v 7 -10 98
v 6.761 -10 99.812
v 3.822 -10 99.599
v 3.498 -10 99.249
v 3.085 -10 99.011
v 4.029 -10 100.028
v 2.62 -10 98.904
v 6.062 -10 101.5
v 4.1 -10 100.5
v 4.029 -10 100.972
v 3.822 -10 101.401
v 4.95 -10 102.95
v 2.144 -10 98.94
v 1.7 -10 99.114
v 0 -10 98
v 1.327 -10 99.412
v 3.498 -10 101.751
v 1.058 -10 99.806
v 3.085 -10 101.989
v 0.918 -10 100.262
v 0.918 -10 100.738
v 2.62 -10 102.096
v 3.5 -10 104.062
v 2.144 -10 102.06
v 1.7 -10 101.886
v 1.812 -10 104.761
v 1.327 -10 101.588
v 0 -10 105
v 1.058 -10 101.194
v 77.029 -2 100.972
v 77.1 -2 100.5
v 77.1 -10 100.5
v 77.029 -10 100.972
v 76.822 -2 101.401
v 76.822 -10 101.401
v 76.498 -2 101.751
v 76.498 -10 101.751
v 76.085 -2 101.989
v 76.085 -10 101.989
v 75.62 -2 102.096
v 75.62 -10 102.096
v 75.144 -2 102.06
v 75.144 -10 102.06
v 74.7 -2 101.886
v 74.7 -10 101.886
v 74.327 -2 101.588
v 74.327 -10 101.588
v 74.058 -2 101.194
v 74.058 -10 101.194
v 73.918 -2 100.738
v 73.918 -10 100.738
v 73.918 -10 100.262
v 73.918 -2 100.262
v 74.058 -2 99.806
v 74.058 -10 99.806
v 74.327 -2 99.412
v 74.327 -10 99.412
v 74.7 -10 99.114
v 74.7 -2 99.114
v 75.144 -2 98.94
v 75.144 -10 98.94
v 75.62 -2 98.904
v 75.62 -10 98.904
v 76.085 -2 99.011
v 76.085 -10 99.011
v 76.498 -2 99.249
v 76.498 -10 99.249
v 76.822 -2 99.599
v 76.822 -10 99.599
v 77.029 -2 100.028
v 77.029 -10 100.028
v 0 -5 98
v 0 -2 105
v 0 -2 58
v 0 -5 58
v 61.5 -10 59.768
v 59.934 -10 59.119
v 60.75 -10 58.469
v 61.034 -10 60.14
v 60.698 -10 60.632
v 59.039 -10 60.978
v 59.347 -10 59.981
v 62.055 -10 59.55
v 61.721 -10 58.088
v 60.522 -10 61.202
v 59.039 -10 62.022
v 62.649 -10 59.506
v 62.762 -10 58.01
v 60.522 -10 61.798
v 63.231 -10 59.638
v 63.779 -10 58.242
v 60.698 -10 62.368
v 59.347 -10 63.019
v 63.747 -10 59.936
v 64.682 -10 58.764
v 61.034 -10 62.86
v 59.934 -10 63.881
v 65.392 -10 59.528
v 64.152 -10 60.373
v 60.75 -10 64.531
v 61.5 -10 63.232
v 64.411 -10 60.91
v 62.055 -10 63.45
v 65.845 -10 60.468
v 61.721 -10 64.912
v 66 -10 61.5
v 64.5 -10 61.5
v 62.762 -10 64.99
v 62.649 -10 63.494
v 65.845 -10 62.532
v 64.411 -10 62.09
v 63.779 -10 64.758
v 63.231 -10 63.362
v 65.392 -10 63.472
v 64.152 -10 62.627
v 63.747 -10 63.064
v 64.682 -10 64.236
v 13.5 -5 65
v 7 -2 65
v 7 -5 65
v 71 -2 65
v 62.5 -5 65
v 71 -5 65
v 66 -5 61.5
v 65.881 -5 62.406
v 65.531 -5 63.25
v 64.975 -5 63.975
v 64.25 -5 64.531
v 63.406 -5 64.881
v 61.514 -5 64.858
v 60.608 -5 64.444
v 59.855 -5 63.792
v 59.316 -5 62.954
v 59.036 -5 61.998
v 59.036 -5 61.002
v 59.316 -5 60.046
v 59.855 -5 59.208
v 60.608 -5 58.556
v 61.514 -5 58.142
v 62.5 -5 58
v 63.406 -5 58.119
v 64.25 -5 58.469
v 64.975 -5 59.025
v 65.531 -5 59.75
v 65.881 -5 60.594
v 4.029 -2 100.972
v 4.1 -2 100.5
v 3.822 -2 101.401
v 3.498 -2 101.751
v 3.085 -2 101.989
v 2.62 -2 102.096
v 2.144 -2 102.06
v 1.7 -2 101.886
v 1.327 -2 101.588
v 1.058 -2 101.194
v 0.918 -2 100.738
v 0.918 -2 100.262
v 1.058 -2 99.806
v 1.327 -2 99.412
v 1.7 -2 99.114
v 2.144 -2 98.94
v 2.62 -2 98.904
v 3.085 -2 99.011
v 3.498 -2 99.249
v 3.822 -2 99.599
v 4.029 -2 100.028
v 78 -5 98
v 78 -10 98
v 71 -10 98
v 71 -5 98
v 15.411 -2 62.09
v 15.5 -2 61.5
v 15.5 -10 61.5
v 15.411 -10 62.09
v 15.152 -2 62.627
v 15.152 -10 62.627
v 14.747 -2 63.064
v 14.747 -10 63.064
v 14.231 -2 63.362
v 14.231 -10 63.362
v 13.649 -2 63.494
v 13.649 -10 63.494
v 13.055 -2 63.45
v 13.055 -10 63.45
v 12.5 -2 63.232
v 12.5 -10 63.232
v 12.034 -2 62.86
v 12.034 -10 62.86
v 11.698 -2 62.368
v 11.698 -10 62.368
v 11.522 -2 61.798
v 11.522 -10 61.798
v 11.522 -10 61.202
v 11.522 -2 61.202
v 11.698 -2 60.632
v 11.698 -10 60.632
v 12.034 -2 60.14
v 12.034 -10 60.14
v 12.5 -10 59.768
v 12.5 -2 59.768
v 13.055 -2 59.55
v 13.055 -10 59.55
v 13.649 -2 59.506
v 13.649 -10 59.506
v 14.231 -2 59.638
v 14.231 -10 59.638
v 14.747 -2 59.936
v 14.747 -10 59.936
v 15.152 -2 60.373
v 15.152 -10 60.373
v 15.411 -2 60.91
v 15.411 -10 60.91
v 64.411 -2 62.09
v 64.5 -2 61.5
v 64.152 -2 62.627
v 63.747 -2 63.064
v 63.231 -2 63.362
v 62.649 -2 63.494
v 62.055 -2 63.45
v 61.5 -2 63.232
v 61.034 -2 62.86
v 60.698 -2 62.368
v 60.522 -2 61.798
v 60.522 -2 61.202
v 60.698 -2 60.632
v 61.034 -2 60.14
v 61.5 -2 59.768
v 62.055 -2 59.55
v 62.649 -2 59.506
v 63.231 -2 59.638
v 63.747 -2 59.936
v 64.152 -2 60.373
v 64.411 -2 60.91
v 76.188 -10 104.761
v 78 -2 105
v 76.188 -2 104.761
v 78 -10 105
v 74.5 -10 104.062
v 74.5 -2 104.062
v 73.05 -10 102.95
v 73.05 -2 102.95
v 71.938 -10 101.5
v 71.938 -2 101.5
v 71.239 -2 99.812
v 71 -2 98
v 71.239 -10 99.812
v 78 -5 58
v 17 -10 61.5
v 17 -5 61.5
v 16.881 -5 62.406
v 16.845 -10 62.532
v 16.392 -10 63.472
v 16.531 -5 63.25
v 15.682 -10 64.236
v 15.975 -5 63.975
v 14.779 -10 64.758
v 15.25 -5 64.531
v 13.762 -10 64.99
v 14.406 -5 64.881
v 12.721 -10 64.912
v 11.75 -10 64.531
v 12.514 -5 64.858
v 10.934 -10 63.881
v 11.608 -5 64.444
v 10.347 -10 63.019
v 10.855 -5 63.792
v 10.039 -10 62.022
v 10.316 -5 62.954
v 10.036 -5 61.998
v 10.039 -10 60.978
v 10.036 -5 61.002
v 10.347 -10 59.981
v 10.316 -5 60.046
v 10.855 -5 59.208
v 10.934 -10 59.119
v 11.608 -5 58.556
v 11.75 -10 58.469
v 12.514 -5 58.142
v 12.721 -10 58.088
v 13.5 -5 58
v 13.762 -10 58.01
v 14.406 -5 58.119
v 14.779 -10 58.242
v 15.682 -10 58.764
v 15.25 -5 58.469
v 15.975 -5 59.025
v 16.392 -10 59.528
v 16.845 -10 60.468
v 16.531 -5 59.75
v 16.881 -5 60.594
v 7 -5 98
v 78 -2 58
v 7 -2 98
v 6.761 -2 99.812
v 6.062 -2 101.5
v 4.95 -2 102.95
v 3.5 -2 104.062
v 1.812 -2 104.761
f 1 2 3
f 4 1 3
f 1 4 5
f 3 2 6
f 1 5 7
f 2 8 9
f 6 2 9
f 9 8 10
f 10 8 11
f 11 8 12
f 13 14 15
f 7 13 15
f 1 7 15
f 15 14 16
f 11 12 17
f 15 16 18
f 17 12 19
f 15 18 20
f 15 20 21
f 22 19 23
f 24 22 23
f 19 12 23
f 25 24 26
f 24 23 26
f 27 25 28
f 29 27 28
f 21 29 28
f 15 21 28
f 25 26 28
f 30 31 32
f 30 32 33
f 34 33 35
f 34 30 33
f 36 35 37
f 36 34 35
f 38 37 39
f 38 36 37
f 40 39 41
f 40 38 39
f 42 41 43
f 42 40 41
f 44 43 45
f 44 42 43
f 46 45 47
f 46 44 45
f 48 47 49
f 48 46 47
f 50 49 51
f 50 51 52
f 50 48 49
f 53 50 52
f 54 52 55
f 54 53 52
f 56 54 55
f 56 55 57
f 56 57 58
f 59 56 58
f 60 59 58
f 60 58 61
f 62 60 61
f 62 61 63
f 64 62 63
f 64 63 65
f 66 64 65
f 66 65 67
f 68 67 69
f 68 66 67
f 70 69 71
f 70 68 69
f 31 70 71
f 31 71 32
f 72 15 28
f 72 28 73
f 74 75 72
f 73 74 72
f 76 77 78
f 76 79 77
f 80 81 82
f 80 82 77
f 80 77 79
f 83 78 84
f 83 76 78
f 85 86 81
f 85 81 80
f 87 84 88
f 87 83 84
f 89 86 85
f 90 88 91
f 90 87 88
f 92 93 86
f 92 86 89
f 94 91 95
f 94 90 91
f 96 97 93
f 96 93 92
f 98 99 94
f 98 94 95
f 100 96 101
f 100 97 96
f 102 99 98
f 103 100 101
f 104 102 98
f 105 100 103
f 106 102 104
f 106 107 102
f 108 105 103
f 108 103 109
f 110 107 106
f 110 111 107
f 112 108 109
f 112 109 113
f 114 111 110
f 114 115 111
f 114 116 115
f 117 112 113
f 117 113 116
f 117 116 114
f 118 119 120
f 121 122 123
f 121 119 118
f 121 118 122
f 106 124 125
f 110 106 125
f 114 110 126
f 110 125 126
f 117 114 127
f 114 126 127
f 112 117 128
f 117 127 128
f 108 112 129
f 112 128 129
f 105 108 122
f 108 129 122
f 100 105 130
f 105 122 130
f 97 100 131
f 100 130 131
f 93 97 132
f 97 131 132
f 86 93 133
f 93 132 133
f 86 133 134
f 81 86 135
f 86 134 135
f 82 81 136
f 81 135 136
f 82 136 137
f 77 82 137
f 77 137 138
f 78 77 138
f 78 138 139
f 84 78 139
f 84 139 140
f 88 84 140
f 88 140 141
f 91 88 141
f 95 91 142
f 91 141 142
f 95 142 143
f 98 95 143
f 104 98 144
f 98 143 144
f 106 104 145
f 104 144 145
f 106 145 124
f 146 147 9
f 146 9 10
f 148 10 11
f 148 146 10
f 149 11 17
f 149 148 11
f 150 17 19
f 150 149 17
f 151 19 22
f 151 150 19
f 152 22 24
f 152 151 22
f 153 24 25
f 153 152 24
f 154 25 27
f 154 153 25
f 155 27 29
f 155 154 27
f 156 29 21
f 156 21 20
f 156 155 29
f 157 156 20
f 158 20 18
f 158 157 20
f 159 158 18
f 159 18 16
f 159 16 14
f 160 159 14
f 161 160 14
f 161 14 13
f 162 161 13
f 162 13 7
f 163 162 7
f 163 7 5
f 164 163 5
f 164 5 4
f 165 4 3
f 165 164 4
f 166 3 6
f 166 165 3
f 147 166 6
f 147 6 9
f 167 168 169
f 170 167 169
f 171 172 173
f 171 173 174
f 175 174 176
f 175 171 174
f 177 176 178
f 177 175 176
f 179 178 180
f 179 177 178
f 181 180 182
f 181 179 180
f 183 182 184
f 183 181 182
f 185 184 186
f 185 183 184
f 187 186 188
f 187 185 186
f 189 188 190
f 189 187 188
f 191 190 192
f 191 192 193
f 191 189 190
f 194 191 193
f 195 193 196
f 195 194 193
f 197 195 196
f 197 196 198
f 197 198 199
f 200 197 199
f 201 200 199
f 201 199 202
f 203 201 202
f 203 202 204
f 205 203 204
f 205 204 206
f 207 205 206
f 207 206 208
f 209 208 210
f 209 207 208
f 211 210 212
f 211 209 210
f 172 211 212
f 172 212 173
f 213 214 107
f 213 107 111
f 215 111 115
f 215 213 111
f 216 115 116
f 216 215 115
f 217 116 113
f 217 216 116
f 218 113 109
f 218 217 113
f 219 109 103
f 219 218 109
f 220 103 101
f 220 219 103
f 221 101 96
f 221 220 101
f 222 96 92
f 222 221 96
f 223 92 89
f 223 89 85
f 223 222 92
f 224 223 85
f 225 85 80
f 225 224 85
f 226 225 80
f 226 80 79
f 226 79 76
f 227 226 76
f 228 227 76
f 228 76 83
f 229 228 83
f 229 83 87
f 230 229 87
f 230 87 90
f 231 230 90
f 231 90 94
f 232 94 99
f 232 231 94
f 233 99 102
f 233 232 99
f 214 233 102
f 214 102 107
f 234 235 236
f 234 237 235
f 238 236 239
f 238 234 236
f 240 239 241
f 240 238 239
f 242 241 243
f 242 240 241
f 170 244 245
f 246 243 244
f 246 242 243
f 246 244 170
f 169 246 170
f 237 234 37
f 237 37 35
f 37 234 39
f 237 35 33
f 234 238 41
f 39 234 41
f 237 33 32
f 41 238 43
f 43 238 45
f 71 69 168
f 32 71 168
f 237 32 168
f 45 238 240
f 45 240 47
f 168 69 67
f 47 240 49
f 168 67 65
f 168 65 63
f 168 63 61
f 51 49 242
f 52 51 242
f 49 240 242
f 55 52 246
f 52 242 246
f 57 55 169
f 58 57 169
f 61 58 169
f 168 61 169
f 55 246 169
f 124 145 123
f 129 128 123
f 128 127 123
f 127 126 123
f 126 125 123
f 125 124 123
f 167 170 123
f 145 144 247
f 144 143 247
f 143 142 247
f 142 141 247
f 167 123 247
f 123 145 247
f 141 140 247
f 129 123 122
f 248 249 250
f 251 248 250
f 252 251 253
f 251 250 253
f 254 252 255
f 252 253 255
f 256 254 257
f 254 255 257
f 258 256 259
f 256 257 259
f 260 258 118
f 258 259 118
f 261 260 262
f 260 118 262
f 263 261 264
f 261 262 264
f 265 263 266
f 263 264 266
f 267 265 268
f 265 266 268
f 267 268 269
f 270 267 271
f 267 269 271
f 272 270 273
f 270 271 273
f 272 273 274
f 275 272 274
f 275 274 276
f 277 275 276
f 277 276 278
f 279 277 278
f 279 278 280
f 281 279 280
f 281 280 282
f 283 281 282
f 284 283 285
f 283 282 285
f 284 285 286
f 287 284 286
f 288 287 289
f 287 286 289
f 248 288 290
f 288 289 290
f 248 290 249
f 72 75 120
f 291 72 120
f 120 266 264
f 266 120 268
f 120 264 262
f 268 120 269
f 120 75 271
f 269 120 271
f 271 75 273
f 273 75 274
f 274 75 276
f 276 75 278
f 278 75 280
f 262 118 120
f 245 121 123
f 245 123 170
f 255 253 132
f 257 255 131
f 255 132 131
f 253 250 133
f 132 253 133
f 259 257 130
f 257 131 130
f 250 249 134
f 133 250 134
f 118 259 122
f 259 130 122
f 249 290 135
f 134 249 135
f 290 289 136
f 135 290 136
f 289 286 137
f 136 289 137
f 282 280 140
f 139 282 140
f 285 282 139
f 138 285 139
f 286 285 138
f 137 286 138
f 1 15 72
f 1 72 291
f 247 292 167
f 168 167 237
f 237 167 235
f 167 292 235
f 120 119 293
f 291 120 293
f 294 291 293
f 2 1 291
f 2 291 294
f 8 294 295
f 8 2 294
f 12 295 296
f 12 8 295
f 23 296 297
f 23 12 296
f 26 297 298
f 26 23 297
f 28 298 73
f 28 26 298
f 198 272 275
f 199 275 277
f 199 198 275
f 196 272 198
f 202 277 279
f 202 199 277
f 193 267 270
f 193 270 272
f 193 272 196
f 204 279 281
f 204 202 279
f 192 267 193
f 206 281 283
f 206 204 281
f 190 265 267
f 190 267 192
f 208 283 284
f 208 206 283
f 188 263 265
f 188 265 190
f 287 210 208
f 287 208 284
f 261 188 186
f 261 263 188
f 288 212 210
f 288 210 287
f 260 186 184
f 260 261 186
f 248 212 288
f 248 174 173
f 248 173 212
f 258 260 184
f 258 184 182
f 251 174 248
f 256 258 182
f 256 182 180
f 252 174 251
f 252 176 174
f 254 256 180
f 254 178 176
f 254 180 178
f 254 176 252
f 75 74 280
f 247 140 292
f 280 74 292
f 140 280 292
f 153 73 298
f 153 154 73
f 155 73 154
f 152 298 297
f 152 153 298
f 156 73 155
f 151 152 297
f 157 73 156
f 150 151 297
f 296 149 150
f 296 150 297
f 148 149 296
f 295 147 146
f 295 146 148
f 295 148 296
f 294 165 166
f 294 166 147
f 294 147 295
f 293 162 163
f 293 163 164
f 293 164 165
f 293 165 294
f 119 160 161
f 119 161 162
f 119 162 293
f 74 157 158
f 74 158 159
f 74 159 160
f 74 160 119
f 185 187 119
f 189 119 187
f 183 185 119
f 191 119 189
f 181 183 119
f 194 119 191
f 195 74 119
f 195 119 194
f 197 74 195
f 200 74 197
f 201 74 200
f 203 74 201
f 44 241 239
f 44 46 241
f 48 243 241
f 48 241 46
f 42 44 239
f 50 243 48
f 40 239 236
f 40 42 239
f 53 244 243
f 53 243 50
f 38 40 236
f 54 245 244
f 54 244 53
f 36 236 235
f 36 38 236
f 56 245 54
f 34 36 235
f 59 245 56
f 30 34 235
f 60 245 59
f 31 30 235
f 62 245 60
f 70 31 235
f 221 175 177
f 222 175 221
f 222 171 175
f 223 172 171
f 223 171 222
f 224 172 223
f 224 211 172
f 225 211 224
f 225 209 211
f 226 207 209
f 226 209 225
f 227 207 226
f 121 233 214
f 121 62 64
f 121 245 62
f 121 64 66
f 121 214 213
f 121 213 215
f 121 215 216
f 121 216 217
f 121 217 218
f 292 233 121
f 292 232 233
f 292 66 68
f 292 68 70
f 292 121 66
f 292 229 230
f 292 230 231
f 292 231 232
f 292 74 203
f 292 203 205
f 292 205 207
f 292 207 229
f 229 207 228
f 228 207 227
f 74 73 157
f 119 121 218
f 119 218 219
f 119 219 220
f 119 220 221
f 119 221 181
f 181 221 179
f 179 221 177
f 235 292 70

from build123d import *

# Parameters (mm, degrees)
CYLINDER032_R     = 2
CYLINDER032_DEPTH = 8
CYLINDER035_R     = 2
CYLINDER035_DEPTH = 8
CYLINDER038_R     = 1.6
CYLINDER038_DEPTH = 8
CYLINDER039_R     = 1.6
CYLINDER039_DEPTH = 8
CYLINDER037_W     = 7
CYLINDER037_H     = 8
CYLINDER037_ANGLE = 90
BOX025_W          = 78
BOX025_H          = 3
BOX025_DEPTH      = 7
BOX026_W          = 40
BOX026_H          = 3
BOX026_DEPTH      = 7
CYLINDER034_R     = 3.5
CYLINDER034_DEPTH = 8
CYLINDER031_R     = 3.5
CYLINDER031_DEPTH = 8
BOX027_W          = 40
BOX027_H          = 3
BOX027_DEPTH      = 7
CYLINDER036_W     = 7
CYLINDER036_H     = 8
CYLINDER036_ANGLE = 90


with BuildPart() as cuts:
    # Cylinder032 → Cylinder032 (new body)
    with BuildSketch(Plane(origin=(13.5, -2, 61.5), x_dir=(1, 0, 0), z_dir=(0, -1, 0))):
        Circle(CYLINDER032_R)
    extrude(amount=CYLINDER032_DEPTH)


with BuildPart() as cuts001:
    # Cylinder035 → Cylinder035 (new body)
    with BuildSketch(Plane(origin=(62.5, -2, 61.5), x_dir=(1, 0, 0), z_dir=(0, -1, 0))):
        Circle(CYLINDER035_R)
    extrude(amount=CYLINDER035_DEPTH)


with BuildPart() as m3screw:
    # Cylinder038 → Cylinder038 (new body)
    with BuildSketch(Plane(origin=(75.5, -2, 100.5), x_dir=(1, 0, 0), z_dir=(0, -1, 0))):
        Circle(CYLINDER038_R)
    extrude(amount=CYLINDER038_DEPTH)


with BuildPart() as c4oldcuts:
    # Cylinder039 → Cylinder039 (new body)
    with BuildSketch(Plane(origin=(2.5, -2, 100.5), x_dir=(1, 0, 0), z_dir=(0, -1, 0))):
        Circle(CYLINDER039_R)
    extrude(amount=CYLINDER039_DEPTH)

    # Fusion016: union cuts, cuts001, m3Screw
    add(cuts.part)
    add(cuts001.part)
    add(m3screw.part)


with BuildPart() as cylinder037:
    # Cylinder037 → Cylinder037 (revolve)
    with BuildSketch(Plane(origin=(0, -2, 98), x_dir=(1, 0, 0), z_dir=(0, 0, -1))):
        with Locations((3.5, 4)):
            Rectangle(CYLINDER037_W, CYLINDER037_H)
    revolve(axis=Axis((0, -2, 98), (0, -1, 0)), revolution_arc=CYLINDER037_ANGLE)


with BuildPart() as cube020:
    # Box025 → Box025 (new body)
    with BuildSketch(Plane(origin=(0, -5, 58), x_dir=(1, 0, 0), z_dir=(0, 0, 1))):
        with Locations((39, 1.5)):
            Rectangle(BOX025_W, BOX025_H)
    extrude(amount=BOX025_DEPTH)


with BuildPart() as cube021:
    # Box026 → Box026 (new body)
    with BuildSketch(Plane(origin=(7, -5, 58), x_dir=(0, 0, 1), z_dir=(-1, 0, 0))):
        with Locations((20, 1.5)):
            Rectangle(BOX026_W, BOX026_H)
    extrude(amount=BOX026_DEPTH)


with BuildPart() as cylinder034:
    # Cylinder034 → Cylinder034 (new body)
    with BuildSketch(Plane(origin=(62.5, -2, 61.5), x_dir=(1, 0, 0), z_dir=(0, -1, 0))):
        Circle(CYLINDER034_R)
    extrude(amount=CYLINDER034_DEPTH)


with BuildPart() as cylinder031:
    # Cylinder031 → Cylinder031 (new body)
    with BuildSketch(Plane(origin=(13.5, -2, 61.5), x_dir=(1, 0, 0), z_dir=(0, -1, 0))):
        Circle(CYLINDER031_R)
    extrude(amount=CYLINDER031_DEPTH)


with BuildPart() as fusion014:
    # Box027 → Box027 (new body)
    with BuildSketch(Plane(origin=(78, -5, 58), x_dir=(0, 0, 1), z_dir=(-1, 0, 0))):
        with Locations((20, 1.5)):
            Rectangle(BOX027_W, BOX027_H)
    extrude(amount=BOX027_DEPTH)

    # Fusion014: union Cube020, Cube021, Cylinder034, Cylinder031
    add(cube020.part)
    add(cube021.part)
    add(cylinder034.part)
    add(cylinder031.part)


with BuildPart() as c4hold001:
    # Cylinder036 → Cylinder036 (revolve)
    with BuildSketch(Plane(origin=(78, -2, 98), x_dir=(0, 0, 1), z_dir=(1, 0, 0))):
        with Locations((3.5, 4)):
            Rectangle(CYLINDER036_W, CYLINDER036_H)
    revolve(axis=Axis((78, -2, 98), (0, -1, 0)), revolution_arc=CYLINDER036_ANGLE)

    # Fusion015: union Cylinder037, Fusion014
    add(cylinder037.part)
    add(fusion014.part)

    # Cut024: cut c4oldCuts
    add(c4oldcuts.part, mode=Mode.SUBTRACT)


solid = c4hold001.part
